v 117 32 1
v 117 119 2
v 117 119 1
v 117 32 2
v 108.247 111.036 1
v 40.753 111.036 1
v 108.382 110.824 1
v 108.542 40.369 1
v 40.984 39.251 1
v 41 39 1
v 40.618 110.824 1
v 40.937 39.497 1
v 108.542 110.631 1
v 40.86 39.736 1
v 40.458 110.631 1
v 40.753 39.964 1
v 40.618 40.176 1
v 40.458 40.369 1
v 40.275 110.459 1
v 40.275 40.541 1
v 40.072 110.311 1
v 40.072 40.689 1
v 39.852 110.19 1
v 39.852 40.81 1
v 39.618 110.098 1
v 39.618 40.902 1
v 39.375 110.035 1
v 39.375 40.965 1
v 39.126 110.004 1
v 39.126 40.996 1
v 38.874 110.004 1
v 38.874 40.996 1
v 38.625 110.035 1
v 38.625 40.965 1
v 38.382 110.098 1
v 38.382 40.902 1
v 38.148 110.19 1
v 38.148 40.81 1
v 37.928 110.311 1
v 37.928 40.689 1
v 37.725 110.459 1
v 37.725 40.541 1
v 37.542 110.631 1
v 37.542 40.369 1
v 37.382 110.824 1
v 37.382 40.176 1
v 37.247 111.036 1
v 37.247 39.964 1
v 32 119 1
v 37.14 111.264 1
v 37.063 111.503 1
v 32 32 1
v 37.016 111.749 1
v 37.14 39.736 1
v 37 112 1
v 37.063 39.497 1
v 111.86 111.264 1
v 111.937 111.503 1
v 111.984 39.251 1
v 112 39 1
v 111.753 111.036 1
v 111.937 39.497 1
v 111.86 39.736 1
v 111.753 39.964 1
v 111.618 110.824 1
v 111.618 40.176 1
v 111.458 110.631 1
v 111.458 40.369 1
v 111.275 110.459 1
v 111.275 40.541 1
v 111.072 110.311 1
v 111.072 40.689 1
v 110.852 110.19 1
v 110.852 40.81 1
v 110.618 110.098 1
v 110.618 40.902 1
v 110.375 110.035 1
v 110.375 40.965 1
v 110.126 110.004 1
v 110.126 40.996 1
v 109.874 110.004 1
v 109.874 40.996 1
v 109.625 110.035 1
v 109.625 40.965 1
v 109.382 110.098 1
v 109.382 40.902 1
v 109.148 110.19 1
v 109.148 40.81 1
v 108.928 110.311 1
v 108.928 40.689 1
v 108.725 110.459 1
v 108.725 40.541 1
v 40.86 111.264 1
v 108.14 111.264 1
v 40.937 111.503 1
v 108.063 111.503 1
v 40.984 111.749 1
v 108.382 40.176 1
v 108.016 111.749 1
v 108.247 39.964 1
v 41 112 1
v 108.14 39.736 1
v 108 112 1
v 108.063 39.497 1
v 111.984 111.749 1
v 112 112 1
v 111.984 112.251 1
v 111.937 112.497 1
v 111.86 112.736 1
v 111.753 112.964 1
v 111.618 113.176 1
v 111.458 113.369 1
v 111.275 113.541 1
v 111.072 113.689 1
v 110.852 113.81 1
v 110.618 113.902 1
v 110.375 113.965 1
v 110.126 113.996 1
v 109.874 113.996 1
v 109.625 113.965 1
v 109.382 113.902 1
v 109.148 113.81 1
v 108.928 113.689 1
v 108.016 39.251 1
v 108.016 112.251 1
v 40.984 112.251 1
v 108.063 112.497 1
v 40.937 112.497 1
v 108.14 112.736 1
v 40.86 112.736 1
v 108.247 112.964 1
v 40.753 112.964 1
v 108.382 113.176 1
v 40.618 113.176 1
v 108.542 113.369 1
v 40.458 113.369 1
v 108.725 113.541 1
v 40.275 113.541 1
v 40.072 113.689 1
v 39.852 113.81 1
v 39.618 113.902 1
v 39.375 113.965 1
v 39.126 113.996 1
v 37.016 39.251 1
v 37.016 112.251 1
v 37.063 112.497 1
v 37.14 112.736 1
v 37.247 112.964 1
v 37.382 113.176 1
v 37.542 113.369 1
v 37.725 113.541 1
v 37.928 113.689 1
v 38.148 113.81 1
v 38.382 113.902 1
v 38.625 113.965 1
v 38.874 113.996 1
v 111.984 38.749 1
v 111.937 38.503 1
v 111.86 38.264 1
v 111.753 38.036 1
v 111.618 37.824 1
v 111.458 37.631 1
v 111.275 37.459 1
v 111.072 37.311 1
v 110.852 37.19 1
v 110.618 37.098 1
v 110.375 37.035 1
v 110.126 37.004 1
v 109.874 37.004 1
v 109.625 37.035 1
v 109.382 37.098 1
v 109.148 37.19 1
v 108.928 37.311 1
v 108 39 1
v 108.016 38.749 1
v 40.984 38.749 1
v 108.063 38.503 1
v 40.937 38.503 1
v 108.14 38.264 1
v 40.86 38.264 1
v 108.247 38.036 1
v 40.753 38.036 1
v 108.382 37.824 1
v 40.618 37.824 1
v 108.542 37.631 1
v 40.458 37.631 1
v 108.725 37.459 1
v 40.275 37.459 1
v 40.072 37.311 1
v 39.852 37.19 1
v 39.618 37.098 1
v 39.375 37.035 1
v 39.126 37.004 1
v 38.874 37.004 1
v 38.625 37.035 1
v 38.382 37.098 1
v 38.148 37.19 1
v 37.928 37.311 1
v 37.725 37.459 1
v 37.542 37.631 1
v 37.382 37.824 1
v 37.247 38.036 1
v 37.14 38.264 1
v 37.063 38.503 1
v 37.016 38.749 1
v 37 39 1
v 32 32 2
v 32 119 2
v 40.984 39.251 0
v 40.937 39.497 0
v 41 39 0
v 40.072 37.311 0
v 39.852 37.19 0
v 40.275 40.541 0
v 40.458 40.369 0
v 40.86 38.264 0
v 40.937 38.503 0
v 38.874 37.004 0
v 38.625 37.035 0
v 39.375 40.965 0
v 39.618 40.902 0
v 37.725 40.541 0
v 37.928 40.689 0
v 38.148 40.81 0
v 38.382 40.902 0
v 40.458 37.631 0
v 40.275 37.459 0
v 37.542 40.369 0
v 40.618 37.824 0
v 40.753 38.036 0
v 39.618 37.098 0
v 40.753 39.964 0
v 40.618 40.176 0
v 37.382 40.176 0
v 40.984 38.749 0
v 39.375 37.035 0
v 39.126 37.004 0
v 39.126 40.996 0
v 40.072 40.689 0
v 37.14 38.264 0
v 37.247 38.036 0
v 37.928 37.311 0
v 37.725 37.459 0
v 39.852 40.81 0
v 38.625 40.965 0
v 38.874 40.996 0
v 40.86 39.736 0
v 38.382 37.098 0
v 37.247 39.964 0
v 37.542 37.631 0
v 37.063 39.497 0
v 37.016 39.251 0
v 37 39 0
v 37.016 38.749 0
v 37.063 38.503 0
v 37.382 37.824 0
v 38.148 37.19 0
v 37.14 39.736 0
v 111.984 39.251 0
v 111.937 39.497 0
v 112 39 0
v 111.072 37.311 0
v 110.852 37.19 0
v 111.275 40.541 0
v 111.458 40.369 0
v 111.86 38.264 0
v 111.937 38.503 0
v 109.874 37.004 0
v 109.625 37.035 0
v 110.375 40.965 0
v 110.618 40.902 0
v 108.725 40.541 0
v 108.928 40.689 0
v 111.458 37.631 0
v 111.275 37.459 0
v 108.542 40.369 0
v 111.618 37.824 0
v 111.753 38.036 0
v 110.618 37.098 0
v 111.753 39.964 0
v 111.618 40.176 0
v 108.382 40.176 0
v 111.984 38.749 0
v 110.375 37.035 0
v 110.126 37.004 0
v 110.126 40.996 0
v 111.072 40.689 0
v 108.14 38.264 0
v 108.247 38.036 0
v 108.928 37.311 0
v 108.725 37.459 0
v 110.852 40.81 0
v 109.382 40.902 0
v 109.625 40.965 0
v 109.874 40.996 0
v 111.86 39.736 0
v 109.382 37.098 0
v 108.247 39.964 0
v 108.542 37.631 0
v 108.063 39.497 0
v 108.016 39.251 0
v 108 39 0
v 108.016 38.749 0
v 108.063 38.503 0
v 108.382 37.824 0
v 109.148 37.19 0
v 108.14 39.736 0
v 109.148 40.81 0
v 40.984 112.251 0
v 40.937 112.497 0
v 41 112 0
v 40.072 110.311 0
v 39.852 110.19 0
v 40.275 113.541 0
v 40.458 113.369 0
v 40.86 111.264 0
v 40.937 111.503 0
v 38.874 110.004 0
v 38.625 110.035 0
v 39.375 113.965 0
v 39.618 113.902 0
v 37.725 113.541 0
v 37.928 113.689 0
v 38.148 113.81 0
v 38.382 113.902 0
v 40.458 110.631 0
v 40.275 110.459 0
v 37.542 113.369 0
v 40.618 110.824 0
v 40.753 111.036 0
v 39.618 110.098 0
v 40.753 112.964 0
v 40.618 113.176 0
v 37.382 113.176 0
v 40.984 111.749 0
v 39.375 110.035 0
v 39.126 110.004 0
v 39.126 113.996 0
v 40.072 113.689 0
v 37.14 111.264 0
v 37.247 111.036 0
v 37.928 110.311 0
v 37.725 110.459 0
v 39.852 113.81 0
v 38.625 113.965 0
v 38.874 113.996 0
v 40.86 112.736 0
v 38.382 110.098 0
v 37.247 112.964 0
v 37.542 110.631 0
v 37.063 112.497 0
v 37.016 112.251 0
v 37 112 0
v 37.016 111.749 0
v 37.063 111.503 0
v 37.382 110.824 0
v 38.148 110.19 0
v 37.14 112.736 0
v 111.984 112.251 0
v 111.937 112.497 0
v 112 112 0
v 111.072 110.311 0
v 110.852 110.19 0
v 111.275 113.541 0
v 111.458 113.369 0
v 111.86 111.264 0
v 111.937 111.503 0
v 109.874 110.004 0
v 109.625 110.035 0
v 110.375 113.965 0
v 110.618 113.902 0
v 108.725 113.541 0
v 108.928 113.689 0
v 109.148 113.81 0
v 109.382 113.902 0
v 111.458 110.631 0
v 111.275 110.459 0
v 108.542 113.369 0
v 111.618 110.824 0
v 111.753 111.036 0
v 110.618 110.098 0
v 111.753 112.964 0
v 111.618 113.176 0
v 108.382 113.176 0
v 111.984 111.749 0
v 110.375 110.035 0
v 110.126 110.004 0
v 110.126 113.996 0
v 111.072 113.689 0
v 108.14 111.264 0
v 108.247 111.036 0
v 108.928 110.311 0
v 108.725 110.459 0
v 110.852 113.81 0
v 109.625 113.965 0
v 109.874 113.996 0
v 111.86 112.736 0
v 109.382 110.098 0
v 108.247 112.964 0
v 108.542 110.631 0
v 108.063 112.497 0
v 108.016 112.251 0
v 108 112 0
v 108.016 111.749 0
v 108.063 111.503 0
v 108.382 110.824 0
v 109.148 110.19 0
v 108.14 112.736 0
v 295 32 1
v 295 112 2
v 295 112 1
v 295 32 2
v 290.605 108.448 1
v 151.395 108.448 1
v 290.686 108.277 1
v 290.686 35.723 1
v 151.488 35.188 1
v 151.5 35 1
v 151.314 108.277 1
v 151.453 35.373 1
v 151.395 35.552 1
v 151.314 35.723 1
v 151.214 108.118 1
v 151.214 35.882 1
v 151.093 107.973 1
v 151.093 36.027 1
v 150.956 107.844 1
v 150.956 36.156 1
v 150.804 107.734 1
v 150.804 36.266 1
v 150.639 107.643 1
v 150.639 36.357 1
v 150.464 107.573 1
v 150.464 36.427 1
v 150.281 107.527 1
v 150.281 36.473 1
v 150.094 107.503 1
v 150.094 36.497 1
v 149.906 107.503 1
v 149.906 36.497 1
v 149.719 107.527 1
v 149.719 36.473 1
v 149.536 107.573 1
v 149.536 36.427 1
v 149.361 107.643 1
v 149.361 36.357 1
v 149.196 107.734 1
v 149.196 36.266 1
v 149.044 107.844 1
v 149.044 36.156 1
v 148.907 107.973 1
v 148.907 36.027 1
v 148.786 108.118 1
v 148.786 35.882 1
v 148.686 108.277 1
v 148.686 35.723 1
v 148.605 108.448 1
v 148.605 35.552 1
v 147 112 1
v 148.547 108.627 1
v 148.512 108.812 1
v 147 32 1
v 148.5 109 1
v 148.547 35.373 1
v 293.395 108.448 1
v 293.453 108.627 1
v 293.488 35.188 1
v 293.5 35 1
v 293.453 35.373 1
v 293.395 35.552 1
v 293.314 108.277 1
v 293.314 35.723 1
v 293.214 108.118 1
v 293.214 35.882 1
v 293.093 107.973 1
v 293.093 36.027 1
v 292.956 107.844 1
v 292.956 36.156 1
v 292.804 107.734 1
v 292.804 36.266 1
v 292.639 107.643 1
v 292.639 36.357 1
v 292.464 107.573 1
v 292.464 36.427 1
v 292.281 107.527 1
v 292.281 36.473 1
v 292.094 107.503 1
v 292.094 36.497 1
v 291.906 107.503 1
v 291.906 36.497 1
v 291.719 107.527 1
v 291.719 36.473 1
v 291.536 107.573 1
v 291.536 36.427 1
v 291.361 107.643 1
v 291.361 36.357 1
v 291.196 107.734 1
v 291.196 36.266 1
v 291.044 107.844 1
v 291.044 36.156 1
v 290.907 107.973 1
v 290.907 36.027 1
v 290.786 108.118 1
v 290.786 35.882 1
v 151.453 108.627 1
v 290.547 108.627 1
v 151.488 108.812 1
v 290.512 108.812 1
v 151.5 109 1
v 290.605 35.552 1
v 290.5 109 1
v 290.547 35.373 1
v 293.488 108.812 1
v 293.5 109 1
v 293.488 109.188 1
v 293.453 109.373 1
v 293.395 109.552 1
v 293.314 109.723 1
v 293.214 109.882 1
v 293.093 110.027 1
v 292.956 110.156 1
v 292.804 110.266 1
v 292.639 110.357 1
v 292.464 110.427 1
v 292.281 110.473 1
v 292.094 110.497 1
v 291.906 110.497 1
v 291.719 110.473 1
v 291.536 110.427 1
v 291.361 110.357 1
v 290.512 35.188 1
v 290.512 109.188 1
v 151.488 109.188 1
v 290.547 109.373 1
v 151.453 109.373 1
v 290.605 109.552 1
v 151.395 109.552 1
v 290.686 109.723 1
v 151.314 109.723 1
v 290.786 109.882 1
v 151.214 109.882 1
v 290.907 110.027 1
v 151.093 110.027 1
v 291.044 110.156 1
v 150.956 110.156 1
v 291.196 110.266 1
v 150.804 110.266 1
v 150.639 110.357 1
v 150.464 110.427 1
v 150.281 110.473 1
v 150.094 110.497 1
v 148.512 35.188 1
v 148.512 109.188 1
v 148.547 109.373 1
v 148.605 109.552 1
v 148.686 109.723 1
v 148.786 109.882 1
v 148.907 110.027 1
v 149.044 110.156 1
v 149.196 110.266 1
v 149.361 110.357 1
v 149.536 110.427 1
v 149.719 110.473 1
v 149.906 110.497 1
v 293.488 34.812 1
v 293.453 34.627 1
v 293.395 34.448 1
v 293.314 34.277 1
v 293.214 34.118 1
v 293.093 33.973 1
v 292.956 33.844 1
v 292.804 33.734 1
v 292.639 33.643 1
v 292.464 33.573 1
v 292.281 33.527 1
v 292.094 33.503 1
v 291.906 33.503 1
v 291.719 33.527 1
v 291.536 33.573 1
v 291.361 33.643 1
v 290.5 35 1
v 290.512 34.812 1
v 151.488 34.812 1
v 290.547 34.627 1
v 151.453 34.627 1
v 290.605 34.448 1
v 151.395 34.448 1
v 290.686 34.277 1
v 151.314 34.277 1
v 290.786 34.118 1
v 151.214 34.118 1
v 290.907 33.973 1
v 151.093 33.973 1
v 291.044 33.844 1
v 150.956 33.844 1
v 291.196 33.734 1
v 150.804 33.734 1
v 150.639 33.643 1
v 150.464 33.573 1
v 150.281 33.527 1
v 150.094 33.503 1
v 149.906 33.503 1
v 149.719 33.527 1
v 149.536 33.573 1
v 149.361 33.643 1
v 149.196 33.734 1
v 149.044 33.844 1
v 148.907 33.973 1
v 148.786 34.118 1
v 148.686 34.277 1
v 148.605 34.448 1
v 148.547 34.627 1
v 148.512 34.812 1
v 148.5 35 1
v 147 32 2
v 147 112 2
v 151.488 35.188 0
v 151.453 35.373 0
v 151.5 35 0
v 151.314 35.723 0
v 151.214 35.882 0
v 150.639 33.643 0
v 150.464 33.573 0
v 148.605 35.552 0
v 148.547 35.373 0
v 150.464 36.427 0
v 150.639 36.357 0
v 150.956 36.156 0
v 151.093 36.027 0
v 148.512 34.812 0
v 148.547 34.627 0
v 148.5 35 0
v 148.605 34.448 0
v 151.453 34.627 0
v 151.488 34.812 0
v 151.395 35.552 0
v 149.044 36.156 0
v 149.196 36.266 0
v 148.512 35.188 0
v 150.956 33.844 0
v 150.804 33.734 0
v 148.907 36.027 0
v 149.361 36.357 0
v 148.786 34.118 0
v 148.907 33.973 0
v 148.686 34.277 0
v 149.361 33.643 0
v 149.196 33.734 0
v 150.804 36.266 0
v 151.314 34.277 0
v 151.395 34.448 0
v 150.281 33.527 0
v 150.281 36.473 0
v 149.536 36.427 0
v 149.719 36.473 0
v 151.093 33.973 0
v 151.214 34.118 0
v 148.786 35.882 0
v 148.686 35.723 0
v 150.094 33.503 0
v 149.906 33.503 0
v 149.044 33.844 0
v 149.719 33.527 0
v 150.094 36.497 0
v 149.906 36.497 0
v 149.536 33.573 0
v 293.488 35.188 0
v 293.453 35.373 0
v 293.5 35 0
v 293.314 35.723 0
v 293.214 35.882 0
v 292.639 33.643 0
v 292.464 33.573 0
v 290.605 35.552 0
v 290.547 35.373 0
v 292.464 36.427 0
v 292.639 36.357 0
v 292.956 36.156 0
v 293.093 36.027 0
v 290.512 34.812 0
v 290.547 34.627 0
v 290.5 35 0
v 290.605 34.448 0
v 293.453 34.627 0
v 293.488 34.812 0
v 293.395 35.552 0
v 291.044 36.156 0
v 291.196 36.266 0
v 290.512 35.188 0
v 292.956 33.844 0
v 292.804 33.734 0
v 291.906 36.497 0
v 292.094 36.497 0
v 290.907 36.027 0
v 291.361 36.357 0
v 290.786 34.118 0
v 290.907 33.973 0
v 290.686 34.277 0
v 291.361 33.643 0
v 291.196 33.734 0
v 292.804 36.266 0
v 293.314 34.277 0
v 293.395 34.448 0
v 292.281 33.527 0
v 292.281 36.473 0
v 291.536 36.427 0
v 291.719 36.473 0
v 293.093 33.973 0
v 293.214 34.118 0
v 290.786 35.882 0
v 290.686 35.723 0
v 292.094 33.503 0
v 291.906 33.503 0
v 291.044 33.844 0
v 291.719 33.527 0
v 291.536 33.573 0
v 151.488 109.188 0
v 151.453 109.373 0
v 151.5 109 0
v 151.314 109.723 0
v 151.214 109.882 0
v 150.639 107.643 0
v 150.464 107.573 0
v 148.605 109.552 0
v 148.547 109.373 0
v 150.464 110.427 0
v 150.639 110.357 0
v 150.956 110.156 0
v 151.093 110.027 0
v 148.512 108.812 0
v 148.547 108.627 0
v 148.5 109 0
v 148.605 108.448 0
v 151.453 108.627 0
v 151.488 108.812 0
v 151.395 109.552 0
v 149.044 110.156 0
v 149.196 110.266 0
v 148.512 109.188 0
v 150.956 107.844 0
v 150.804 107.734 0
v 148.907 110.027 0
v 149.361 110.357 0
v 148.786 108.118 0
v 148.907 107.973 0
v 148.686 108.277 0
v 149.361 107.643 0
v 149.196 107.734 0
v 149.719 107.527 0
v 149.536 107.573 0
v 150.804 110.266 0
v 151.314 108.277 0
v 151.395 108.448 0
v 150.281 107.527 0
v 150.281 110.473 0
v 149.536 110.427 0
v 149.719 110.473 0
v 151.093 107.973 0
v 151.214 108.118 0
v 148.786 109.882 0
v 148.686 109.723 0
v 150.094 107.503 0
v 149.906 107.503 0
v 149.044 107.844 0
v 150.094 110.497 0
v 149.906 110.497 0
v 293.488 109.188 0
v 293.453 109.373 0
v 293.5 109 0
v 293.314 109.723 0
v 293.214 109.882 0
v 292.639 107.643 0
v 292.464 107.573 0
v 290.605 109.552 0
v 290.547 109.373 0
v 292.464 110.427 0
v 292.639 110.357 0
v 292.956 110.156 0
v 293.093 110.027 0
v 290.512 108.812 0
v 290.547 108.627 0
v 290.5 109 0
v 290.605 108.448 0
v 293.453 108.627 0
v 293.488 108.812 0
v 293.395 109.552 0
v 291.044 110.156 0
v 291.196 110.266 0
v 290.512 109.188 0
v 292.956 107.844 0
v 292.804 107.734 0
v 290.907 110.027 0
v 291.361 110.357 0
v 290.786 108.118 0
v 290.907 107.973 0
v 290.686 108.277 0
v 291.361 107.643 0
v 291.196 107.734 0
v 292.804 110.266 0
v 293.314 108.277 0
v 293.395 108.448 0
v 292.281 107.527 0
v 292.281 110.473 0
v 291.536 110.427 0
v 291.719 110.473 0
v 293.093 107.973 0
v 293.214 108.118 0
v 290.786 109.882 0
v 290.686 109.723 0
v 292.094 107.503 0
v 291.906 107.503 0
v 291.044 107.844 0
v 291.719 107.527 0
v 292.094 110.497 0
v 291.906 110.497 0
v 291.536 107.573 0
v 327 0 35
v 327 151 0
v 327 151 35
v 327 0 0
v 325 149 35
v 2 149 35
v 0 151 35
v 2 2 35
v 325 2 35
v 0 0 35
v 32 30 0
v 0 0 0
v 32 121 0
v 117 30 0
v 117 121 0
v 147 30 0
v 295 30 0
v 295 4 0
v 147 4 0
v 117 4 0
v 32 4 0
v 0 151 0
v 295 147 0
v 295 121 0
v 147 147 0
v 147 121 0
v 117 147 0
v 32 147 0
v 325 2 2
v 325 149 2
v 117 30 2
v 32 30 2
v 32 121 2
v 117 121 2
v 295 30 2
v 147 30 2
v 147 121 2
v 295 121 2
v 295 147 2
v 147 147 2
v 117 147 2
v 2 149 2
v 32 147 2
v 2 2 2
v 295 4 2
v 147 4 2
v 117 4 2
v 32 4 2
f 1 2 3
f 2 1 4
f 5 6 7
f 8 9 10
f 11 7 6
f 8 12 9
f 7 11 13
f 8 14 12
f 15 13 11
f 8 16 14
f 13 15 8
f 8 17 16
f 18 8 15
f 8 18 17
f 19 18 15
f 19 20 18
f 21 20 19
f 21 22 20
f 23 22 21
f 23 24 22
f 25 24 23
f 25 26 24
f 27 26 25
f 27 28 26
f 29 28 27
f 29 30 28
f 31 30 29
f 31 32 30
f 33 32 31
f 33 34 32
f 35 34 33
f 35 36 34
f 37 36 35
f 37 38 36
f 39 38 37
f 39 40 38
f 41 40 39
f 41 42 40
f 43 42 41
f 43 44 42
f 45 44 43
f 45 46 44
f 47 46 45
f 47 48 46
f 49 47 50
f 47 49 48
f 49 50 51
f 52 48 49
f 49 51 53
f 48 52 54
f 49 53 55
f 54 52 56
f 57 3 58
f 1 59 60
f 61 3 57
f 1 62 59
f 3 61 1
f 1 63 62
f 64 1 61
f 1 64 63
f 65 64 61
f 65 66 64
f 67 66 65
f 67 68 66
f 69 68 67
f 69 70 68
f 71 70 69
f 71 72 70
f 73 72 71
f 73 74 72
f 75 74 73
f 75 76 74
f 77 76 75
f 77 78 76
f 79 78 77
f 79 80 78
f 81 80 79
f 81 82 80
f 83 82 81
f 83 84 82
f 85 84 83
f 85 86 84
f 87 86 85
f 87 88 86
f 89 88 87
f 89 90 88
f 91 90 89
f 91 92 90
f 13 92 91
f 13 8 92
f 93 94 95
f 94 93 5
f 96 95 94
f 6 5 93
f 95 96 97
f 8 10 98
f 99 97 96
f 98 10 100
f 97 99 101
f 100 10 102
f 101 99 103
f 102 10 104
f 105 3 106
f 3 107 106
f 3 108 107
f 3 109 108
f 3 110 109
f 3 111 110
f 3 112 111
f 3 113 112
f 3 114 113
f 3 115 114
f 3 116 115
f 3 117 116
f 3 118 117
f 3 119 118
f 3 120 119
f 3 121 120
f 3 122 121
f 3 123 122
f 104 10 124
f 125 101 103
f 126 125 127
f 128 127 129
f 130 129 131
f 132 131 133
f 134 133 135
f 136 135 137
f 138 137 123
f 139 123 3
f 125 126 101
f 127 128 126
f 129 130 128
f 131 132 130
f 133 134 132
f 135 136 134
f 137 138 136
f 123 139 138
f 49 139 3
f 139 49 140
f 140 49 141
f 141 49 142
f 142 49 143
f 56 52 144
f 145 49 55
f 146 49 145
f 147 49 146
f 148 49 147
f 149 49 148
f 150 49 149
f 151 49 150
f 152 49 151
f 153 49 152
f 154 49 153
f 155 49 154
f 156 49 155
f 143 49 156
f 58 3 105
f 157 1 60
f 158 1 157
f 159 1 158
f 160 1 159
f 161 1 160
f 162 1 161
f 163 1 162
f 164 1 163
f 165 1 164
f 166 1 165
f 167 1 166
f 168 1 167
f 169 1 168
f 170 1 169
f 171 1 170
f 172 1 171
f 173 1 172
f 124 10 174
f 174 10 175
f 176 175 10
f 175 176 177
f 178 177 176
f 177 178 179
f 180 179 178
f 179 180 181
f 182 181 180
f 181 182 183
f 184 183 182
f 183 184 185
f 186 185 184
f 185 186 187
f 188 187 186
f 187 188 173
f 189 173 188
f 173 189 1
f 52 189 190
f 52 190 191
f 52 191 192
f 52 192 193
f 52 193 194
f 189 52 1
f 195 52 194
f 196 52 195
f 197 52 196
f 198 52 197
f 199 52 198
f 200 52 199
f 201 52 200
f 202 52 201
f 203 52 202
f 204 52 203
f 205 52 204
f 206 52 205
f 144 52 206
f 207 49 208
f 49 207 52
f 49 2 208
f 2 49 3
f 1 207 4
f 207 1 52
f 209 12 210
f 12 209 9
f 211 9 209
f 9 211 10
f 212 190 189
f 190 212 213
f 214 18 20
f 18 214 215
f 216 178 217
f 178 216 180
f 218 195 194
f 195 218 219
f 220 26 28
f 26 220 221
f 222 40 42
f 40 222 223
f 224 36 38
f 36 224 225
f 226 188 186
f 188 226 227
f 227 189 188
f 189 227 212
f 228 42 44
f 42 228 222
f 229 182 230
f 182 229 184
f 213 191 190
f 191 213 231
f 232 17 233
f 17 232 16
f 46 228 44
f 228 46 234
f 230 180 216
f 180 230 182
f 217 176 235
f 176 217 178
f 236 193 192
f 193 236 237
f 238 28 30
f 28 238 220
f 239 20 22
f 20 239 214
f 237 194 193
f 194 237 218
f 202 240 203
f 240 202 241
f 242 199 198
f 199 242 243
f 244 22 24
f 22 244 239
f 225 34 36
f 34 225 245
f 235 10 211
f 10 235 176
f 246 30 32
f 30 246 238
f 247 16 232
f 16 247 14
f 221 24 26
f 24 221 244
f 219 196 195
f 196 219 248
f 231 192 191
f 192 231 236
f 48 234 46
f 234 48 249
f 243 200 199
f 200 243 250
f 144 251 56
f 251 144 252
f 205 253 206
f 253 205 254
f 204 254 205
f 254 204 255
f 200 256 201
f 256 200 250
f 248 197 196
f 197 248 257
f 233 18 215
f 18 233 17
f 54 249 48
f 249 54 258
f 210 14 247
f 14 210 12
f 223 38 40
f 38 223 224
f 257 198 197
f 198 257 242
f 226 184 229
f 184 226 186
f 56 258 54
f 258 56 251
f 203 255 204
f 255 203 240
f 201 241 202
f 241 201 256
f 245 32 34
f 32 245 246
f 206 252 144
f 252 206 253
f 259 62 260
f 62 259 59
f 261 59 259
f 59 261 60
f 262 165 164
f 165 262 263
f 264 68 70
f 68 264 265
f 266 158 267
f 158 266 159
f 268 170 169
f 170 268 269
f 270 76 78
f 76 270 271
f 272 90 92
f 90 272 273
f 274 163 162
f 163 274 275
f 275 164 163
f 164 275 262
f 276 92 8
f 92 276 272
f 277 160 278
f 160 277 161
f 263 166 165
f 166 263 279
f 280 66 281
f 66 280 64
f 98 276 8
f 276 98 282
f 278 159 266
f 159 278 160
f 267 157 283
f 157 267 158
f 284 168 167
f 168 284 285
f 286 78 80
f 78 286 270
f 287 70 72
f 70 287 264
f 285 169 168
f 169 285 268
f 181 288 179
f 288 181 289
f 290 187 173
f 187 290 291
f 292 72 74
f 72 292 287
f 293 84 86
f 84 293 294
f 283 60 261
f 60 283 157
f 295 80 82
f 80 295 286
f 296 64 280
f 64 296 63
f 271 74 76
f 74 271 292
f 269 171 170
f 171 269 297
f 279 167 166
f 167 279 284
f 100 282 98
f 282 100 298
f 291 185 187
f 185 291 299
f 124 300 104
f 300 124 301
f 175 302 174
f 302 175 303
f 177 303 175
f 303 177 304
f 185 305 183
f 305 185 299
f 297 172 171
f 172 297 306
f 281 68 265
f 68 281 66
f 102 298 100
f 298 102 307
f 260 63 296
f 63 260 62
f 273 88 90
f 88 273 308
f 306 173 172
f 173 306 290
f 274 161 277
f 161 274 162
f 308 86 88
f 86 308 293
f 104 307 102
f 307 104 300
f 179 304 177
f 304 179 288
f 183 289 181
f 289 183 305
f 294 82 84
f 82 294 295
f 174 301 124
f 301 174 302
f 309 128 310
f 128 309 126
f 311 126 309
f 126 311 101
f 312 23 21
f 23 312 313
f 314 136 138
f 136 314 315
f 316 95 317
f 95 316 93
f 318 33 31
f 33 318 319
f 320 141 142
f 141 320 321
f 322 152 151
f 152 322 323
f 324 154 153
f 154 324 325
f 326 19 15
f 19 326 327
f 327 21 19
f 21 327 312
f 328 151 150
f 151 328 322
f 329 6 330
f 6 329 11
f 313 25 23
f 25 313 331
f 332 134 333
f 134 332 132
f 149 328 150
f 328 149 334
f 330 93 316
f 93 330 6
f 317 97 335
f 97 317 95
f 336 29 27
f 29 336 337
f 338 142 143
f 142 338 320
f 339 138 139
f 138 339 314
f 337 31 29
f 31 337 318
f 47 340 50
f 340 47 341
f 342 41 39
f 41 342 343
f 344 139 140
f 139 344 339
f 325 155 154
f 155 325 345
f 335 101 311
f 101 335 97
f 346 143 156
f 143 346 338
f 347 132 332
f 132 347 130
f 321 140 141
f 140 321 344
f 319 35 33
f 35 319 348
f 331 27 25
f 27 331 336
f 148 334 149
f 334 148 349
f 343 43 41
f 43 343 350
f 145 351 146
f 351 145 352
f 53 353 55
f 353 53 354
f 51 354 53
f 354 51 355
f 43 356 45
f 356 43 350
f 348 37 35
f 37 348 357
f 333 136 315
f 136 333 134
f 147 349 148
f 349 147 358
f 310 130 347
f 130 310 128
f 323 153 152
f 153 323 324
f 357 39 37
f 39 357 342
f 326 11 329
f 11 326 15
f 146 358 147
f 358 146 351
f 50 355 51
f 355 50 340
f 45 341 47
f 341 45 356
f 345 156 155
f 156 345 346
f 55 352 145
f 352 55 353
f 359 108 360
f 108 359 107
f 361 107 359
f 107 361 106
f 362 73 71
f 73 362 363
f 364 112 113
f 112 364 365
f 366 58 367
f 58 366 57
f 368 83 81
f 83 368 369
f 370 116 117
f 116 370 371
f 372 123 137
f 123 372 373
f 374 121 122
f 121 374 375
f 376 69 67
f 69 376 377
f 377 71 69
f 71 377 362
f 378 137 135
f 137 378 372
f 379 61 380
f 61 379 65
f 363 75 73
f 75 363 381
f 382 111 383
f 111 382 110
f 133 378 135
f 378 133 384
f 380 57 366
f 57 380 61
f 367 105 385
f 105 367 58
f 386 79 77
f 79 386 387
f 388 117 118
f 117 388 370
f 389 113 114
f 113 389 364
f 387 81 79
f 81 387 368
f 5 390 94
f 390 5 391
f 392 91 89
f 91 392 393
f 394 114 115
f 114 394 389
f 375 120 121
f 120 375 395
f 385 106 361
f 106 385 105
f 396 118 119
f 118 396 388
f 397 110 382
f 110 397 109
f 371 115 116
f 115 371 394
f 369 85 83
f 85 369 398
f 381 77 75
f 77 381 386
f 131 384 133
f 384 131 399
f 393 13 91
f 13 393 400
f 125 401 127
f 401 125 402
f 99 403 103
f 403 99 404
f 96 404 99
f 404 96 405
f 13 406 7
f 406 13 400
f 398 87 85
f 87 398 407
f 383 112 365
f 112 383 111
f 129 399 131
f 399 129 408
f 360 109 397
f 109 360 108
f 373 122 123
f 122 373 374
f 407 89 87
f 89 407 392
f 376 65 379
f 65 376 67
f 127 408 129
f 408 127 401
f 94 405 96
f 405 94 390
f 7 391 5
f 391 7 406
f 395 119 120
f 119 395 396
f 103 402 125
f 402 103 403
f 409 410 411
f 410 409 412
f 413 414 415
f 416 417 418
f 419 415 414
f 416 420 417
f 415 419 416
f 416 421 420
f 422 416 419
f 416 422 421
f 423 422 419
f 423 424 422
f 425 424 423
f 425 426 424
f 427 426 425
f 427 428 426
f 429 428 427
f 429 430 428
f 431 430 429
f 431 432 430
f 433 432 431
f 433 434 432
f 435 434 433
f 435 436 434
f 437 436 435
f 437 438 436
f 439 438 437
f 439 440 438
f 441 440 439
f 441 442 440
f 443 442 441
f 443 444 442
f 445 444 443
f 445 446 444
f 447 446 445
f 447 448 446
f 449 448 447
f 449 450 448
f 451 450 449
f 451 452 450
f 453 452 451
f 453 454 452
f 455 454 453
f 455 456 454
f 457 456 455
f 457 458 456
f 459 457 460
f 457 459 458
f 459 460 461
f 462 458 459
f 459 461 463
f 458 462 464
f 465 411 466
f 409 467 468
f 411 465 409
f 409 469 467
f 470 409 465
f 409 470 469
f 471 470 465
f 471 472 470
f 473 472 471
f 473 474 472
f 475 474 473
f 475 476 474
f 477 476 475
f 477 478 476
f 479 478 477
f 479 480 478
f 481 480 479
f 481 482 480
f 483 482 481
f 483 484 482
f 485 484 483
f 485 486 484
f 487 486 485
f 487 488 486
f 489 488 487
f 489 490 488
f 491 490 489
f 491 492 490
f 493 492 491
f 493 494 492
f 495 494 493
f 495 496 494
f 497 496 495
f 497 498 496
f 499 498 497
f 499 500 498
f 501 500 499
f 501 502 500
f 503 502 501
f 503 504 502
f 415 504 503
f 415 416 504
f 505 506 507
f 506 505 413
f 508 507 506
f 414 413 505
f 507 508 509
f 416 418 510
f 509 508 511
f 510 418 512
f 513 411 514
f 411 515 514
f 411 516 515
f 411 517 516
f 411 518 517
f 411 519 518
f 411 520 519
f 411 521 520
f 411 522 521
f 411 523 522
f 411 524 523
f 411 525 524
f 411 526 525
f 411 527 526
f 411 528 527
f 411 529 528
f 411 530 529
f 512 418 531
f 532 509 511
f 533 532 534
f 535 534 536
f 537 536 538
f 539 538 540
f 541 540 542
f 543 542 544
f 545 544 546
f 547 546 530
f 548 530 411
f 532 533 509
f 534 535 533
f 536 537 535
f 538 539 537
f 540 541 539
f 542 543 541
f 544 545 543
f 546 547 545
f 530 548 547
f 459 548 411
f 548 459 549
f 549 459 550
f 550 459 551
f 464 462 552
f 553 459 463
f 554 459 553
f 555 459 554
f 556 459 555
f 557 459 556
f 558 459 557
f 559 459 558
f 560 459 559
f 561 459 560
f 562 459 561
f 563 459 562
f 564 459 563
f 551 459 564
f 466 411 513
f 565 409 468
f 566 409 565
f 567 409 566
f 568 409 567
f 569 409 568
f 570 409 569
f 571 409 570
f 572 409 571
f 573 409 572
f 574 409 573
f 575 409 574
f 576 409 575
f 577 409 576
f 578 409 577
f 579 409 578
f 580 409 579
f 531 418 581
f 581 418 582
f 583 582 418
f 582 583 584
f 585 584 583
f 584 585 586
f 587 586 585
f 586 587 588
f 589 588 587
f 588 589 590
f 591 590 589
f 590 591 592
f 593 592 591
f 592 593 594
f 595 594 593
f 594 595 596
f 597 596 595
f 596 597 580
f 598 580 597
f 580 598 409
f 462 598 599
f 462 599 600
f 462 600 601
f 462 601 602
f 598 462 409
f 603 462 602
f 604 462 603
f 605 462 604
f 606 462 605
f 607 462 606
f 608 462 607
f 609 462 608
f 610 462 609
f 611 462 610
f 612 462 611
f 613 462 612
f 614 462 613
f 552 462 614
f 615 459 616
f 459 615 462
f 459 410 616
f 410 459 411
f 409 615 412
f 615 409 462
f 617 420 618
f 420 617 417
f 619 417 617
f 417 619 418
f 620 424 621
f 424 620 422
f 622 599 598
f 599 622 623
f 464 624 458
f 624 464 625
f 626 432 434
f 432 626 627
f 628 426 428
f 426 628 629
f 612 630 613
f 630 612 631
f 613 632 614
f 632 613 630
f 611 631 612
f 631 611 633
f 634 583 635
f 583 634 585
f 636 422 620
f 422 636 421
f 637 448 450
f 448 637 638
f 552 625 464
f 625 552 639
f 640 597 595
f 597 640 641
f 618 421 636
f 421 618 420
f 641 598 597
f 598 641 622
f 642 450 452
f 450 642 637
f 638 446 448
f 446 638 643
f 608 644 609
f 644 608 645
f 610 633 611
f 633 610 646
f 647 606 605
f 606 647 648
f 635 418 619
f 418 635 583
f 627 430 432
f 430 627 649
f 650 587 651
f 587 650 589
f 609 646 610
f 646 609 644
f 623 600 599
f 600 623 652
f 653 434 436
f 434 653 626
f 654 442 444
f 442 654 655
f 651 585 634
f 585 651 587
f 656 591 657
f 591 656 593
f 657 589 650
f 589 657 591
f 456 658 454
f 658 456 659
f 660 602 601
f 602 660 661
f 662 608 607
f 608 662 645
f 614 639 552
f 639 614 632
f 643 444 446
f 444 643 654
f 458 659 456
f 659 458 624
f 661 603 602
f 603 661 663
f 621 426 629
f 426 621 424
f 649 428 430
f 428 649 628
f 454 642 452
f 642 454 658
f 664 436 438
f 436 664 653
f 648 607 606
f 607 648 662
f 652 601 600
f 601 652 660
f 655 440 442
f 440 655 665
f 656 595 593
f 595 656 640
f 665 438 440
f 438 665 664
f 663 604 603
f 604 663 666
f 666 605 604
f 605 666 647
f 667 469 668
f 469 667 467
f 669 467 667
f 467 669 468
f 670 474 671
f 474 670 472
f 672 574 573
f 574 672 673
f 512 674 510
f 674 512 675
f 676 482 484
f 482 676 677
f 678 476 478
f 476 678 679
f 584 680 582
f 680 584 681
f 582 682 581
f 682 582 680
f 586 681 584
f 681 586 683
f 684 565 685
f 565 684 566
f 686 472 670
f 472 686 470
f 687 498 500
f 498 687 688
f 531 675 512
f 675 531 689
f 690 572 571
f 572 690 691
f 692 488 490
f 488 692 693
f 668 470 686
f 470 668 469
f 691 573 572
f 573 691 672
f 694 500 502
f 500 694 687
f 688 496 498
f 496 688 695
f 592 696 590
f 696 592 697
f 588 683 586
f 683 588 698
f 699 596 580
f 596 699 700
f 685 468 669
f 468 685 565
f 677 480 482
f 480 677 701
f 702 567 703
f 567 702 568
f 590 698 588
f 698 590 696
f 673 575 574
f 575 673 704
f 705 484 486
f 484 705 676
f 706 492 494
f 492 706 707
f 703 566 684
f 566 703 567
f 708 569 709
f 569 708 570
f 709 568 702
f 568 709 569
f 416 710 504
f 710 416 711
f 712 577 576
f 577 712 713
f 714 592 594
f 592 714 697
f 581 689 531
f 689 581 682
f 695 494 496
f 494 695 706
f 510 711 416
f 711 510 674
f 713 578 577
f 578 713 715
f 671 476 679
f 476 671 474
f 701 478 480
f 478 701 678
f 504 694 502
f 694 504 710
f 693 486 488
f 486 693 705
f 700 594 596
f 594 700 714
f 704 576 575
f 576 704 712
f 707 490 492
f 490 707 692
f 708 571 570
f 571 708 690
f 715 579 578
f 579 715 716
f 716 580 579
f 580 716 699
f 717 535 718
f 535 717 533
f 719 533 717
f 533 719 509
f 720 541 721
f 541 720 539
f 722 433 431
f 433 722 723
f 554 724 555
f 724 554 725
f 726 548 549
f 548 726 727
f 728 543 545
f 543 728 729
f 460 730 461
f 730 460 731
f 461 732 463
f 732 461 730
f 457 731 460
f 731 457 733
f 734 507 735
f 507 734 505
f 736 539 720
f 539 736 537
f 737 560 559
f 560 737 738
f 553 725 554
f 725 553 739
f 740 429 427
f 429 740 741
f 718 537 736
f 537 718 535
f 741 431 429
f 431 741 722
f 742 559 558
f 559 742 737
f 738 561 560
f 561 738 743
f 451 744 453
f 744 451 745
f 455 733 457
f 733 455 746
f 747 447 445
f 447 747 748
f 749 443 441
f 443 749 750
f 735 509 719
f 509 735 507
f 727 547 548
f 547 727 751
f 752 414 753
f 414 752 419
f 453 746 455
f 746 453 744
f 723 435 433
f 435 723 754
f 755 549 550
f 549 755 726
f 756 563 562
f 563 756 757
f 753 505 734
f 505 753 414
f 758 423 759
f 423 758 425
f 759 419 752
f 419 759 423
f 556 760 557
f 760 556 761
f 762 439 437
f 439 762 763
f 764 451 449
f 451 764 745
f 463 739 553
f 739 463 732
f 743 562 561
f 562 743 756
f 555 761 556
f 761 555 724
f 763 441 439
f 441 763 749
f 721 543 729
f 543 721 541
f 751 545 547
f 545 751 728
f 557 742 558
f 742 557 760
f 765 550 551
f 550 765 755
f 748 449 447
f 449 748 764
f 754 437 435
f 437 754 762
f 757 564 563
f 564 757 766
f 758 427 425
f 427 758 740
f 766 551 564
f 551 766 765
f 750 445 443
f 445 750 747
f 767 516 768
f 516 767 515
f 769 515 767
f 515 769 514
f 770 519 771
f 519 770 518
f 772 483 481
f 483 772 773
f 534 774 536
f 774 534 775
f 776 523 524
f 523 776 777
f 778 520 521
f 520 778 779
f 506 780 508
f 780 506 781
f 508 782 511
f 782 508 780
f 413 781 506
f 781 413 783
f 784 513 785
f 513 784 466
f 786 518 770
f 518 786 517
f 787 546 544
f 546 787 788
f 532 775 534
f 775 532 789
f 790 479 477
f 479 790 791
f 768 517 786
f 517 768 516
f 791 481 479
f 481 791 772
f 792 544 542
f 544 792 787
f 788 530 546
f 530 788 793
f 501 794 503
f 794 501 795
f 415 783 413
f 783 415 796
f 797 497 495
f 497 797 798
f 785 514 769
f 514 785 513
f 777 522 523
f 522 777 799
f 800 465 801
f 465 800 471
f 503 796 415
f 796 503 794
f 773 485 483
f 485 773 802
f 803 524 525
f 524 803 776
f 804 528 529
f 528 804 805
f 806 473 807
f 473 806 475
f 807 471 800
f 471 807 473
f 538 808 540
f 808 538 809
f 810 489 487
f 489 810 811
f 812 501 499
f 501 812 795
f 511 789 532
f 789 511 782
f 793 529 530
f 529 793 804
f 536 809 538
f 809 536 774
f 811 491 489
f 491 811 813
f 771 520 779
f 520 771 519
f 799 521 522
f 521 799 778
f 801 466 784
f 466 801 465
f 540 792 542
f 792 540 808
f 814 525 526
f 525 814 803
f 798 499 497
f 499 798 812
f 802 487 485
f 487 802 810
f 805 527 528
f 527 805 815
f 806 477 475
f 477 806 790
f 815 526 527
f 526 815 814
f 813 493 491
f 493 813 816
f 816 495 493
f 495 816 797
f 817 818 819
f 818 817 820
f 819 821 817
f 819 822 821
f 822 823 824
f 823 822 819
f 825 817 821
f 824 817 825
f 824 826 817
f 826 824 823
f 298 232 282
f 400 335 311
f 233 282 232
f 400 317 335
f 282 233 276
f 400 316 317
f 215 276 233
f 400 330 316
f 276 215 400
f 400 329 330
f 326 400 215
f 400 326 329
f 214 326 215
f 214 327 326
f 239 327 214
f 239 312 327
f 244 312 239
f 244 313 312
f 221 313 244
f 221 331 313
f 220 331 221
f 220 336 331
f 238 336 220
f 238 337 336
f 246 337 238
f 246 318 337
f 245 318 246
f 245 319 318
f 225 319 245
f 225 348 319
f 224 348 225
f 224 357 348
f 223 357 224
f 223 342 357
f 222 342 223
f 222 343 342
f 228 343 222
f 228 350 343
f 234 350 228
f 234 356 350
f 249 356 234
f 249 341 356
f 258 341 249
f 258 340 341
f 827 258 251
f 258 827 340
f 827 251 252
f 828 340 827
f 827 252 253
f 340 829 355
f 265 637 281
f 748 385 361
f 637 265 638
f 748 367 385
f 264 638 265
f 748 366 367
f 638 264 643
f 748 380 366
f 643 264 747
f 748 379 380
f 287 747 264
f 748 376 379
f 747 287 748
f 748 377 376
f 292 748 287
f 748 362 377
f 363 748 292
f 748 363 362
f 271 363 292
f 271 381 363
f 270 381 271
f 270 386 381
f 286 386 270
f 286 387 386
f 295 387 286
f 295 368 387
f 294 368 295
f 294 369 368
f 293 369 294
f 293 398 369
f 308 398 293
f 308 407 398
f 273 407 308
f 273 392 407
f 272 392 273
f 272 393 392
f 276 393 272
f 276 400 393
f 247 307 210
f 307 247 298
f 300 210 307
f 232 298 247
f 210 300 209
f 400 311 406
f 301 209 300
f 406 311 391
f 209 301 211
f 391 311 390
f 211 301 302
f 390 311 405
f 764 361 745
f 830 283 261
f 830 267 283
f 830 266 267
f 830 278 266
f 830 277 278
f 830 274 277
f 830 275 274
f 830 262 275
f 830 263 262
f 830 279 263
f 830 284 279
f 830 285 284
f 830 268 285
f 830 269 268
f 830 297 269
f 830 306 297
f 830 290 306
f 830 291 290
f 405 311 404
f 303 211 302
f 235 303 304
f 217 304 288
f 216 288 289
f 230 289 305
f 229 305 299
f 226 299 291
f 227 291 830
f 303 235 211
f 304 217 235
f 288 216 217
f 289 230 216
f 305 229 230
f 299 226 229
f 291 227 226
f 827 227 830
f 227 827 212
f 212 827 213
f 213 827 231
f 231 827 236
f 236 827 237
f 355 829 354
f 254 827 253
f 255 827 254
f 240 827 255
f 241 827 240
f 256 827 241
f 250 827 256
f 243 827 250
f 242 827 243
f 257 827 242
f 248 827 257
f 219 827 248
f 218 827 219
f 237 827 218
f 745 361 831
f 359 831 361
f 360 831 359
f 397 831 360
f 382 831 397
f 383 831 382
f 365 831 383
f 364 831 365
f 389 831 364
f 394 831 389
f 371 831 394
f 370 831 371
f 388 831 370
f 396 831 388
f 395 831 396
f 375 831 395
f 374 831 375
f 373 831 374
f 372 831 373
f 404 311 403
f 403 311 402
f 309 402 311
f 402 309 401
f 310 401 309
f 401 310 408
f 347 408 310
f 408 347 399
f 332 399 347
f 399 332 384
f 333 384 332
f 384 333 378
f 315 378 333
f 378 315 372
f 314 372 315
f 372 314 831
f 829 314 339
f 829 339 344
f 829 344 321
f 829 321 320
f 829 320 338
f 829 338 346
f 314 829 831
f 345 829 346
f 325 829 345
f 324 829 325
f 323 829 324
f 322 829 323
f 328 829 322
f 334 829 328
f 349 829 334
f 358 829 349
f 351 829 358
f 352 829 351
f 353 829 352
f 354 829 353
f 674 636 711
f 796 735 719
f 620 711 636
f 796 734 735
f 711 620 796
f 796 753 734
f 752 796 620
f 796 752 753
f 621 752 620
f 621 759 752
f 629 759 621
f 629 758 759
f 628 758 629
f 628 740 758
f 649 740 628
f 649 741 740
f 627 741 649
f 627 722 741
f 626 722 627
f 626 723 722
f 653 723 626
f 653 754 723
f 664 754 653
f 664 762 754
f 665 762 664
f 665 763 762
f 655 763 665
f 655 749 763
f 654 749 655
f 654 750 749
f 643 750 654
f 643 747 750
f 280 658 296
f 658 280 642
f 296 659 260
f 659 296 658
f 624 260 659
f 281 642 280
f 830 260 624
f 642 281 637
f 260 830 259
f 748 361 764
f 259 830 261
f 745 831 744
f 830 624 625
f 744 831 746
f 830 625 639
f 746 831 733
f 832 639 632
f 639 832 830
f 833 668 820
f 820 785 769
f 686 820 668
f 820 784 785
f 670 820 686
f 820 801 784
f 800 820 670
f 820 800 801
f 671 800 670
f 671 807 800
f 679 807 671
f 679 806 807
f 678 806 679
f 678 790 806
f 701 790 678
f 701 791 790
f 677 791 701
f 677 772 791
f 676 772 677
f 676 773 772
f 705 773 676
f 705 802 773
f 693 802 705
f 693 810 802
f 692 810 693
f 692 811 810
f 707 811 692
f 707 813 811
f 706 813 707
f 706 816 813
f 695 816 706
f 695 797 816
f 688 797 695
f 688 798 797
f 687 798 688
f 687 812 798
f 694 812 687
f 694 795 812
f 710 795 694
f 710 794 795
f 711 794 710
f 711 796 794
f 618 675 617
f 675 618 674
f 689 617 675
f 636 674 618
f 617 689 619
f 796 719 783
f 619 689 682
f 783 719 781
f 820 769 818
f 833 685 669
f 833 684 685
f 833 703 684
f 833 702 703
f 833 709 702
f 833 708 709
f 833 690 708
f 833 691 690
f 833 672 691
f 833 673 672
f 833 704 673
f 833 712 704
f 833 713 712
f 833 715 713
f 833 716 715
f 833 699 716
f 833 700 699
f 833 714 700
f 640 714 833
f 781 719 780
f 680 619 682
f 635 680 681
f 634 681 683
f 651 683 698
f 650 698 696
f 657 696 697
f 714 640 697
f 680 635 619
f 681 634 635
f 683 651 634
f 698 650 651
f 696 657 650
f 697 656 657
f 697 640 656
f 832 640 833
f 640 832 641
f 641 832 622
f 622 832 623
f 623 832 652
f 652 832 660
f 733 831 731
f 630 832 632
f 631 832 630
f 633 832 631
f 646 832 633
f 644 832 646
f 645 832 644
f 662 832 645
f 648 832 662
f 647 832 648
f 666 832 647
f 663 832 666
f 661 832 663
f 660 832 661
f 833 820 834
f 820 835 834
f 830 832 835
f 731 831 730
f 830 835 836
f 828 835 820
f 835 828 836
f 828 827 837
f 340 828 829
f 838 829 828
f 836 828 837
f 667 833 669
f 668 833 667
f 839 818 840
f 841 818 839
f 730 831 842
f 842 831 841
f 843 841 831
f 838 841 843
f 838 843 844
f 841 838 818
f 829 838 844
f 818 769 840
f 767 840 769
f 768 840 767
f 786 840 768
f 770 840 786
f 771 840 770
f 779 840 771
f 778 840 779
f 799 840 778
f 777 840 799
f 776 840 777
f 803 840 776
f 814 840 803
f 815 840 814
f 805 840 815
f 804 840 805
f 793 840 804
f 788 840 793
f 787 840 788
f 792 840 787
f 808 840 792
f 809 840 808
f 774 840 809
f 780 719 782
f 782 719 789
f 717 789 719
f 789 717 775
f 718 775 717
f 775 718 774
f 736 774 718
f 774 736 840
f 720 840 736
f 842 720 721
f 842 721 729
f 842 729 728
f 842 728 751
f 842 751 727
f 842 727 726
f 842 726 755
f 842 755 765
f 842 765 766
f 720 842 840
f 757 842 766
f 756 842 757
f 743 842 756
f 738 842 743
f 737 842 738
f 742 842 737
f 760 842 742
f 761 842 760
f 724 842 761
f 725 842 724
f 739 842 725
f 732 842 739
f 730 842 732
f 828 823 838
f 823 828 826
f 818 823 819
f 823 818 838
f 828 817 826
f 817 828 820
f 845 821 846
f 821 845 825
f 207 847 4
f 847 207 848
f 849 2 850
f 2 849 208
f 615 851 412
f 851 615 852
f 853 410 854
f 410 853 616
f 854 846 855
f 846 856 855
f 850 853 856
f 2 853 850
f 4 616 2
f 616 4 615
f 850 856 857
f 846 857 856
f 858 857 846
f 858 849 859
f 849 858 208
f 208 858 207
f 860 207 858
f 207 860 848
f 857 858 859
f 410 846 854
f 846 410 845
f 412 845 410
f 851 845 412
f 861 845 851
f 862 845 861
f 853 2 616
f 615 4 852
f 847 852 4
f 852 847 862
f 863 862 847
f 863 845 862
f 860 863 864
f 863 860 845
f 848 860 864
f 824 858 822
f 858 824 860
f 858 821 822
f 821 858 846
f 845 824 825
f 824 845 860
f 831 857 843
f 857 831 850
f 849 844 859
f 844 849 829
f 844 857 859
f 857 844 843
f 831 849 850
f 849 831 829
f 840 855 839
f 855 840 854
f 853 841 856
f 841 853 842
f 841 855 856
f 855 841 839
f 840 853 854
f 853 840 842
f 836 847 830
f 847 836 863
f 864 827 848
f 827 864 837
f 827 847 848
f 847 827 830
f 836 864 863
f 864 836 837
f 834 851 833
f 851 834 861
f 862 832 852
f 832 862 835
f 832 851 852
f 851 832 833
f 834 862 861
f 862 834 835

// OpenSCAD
/**

Mounting for 6 way 12v fuse box and 8 way modbus board
@idnorton

Licenced as Creative Commons Attribution Non Commercial 3.0
See https://creativecommons.org/licenses/by-nc/3.0/

Specifically you may not sell the design or products using the design.
You're welcome to use the design to build things for your own use :)

Print settings: 0.20mm SPEED
Supports: None
Infill: 20%
Perimiters: 3

**/

cable_border = 30;

fuse_x = 85;
fuse_y = 87;

modbus_x = 148;
modbus_y = 80;

wall_thickness = 2;
wall_x = fuse_x + modbus_x + (3 * cable_border) + (2 * wall_thickness);
wall_y = max(fuse_y, modbus_y) + (2 * cable_border) + (2 * wall_thickness);
wall_z = 35;

difference() {
    
    // Exterior body
    cube([wall_x, wall_y, wall_z]);
    
    // Hollow out the main body
    translate([
      wall_thickness,
      wall_thickness,
      wall_thickness
    ]) {
      cube([
        wall_x - (2 * wall_thickness),
        wall_y - (2 * wall_thickness),
        wall_z - wall_thickness]);  
    }
    
    // Fuse box outline and mounting holes
    translate([
        wall_thickness + cable_border,
        wall_thickness + cable_border,
        wall_thickness - 1
    ]) {
        fusebox();
    }
    
    // Modbus mounting holes
    translate([
        wall_thickness + (2 * cable_border) + fuse_x,
        wall_thickness + cable_border,
        wall_thickness - 1
    ]) {
        modbus();
    }
    
    // Cable cutouts above
    translate([wall_thickness + cable_border, wall_y - cable_border, 0]) {
        cube([fuse_x, cable_border - 4, (wall_thickness * 2)]);
    }

    translate([wall_thickness + (2 * cable_border) + fuse_x, wall_y - cable_border, 0]) {
        cube([modbus_x, cable_border - 4, (wall_thickness * 2)]);
    }

    // Cable cutouts below
    translate([wall_thickness + cable_border, wall_thickness + 2, 0]) {
        cube([fuse_x, cable_border - 4, (wall_thickness * 2)]);
    }

    translate([wall_thickness + (2 * cable_border) + fuse_x, wall_thickness + 2, 0]) {
        cube([modbus_x, cable_border - 4, (wall_thickness * 2)]);
    }    
}

module fusebox() {
    // Fuse box outline
    cube([fuse_x, fuse_y, wall_thickness]);

    // Mounting holes
    translate([7, 7, 0]) { hole(d=4); }
    translate([fuse_x - 7, 7, 0]) { hole(d=4); }
    translate([7, fuse_y - 7, 0]) { hole(d=4); }
    translate([fuse_x - 7, fuse_y - 7, 0]) { hole(d=4); }
}

module hole(d = 4) {
    cylinder(h = (wall_thickness * 2), d = d, center = true, $fn=50);
}

module modbus() {
    // PCB outline
    cube([modbus_x, modbus_y, wall_thickness]);
    
    // Mounting holes    
    translate([3, 3, 0]) { hole(d=3); } // Bottom left
    translate([modbus_x - 3, 3, 0]) { hole(d=3); } // Bottom right
    translate([3, modbus_y - 3, 0]) { hole(d=3); } // Top left
    translate([modbus_x - 3, modbus_y - 3, 0]) { hole(d=3); } // Top right  
}
